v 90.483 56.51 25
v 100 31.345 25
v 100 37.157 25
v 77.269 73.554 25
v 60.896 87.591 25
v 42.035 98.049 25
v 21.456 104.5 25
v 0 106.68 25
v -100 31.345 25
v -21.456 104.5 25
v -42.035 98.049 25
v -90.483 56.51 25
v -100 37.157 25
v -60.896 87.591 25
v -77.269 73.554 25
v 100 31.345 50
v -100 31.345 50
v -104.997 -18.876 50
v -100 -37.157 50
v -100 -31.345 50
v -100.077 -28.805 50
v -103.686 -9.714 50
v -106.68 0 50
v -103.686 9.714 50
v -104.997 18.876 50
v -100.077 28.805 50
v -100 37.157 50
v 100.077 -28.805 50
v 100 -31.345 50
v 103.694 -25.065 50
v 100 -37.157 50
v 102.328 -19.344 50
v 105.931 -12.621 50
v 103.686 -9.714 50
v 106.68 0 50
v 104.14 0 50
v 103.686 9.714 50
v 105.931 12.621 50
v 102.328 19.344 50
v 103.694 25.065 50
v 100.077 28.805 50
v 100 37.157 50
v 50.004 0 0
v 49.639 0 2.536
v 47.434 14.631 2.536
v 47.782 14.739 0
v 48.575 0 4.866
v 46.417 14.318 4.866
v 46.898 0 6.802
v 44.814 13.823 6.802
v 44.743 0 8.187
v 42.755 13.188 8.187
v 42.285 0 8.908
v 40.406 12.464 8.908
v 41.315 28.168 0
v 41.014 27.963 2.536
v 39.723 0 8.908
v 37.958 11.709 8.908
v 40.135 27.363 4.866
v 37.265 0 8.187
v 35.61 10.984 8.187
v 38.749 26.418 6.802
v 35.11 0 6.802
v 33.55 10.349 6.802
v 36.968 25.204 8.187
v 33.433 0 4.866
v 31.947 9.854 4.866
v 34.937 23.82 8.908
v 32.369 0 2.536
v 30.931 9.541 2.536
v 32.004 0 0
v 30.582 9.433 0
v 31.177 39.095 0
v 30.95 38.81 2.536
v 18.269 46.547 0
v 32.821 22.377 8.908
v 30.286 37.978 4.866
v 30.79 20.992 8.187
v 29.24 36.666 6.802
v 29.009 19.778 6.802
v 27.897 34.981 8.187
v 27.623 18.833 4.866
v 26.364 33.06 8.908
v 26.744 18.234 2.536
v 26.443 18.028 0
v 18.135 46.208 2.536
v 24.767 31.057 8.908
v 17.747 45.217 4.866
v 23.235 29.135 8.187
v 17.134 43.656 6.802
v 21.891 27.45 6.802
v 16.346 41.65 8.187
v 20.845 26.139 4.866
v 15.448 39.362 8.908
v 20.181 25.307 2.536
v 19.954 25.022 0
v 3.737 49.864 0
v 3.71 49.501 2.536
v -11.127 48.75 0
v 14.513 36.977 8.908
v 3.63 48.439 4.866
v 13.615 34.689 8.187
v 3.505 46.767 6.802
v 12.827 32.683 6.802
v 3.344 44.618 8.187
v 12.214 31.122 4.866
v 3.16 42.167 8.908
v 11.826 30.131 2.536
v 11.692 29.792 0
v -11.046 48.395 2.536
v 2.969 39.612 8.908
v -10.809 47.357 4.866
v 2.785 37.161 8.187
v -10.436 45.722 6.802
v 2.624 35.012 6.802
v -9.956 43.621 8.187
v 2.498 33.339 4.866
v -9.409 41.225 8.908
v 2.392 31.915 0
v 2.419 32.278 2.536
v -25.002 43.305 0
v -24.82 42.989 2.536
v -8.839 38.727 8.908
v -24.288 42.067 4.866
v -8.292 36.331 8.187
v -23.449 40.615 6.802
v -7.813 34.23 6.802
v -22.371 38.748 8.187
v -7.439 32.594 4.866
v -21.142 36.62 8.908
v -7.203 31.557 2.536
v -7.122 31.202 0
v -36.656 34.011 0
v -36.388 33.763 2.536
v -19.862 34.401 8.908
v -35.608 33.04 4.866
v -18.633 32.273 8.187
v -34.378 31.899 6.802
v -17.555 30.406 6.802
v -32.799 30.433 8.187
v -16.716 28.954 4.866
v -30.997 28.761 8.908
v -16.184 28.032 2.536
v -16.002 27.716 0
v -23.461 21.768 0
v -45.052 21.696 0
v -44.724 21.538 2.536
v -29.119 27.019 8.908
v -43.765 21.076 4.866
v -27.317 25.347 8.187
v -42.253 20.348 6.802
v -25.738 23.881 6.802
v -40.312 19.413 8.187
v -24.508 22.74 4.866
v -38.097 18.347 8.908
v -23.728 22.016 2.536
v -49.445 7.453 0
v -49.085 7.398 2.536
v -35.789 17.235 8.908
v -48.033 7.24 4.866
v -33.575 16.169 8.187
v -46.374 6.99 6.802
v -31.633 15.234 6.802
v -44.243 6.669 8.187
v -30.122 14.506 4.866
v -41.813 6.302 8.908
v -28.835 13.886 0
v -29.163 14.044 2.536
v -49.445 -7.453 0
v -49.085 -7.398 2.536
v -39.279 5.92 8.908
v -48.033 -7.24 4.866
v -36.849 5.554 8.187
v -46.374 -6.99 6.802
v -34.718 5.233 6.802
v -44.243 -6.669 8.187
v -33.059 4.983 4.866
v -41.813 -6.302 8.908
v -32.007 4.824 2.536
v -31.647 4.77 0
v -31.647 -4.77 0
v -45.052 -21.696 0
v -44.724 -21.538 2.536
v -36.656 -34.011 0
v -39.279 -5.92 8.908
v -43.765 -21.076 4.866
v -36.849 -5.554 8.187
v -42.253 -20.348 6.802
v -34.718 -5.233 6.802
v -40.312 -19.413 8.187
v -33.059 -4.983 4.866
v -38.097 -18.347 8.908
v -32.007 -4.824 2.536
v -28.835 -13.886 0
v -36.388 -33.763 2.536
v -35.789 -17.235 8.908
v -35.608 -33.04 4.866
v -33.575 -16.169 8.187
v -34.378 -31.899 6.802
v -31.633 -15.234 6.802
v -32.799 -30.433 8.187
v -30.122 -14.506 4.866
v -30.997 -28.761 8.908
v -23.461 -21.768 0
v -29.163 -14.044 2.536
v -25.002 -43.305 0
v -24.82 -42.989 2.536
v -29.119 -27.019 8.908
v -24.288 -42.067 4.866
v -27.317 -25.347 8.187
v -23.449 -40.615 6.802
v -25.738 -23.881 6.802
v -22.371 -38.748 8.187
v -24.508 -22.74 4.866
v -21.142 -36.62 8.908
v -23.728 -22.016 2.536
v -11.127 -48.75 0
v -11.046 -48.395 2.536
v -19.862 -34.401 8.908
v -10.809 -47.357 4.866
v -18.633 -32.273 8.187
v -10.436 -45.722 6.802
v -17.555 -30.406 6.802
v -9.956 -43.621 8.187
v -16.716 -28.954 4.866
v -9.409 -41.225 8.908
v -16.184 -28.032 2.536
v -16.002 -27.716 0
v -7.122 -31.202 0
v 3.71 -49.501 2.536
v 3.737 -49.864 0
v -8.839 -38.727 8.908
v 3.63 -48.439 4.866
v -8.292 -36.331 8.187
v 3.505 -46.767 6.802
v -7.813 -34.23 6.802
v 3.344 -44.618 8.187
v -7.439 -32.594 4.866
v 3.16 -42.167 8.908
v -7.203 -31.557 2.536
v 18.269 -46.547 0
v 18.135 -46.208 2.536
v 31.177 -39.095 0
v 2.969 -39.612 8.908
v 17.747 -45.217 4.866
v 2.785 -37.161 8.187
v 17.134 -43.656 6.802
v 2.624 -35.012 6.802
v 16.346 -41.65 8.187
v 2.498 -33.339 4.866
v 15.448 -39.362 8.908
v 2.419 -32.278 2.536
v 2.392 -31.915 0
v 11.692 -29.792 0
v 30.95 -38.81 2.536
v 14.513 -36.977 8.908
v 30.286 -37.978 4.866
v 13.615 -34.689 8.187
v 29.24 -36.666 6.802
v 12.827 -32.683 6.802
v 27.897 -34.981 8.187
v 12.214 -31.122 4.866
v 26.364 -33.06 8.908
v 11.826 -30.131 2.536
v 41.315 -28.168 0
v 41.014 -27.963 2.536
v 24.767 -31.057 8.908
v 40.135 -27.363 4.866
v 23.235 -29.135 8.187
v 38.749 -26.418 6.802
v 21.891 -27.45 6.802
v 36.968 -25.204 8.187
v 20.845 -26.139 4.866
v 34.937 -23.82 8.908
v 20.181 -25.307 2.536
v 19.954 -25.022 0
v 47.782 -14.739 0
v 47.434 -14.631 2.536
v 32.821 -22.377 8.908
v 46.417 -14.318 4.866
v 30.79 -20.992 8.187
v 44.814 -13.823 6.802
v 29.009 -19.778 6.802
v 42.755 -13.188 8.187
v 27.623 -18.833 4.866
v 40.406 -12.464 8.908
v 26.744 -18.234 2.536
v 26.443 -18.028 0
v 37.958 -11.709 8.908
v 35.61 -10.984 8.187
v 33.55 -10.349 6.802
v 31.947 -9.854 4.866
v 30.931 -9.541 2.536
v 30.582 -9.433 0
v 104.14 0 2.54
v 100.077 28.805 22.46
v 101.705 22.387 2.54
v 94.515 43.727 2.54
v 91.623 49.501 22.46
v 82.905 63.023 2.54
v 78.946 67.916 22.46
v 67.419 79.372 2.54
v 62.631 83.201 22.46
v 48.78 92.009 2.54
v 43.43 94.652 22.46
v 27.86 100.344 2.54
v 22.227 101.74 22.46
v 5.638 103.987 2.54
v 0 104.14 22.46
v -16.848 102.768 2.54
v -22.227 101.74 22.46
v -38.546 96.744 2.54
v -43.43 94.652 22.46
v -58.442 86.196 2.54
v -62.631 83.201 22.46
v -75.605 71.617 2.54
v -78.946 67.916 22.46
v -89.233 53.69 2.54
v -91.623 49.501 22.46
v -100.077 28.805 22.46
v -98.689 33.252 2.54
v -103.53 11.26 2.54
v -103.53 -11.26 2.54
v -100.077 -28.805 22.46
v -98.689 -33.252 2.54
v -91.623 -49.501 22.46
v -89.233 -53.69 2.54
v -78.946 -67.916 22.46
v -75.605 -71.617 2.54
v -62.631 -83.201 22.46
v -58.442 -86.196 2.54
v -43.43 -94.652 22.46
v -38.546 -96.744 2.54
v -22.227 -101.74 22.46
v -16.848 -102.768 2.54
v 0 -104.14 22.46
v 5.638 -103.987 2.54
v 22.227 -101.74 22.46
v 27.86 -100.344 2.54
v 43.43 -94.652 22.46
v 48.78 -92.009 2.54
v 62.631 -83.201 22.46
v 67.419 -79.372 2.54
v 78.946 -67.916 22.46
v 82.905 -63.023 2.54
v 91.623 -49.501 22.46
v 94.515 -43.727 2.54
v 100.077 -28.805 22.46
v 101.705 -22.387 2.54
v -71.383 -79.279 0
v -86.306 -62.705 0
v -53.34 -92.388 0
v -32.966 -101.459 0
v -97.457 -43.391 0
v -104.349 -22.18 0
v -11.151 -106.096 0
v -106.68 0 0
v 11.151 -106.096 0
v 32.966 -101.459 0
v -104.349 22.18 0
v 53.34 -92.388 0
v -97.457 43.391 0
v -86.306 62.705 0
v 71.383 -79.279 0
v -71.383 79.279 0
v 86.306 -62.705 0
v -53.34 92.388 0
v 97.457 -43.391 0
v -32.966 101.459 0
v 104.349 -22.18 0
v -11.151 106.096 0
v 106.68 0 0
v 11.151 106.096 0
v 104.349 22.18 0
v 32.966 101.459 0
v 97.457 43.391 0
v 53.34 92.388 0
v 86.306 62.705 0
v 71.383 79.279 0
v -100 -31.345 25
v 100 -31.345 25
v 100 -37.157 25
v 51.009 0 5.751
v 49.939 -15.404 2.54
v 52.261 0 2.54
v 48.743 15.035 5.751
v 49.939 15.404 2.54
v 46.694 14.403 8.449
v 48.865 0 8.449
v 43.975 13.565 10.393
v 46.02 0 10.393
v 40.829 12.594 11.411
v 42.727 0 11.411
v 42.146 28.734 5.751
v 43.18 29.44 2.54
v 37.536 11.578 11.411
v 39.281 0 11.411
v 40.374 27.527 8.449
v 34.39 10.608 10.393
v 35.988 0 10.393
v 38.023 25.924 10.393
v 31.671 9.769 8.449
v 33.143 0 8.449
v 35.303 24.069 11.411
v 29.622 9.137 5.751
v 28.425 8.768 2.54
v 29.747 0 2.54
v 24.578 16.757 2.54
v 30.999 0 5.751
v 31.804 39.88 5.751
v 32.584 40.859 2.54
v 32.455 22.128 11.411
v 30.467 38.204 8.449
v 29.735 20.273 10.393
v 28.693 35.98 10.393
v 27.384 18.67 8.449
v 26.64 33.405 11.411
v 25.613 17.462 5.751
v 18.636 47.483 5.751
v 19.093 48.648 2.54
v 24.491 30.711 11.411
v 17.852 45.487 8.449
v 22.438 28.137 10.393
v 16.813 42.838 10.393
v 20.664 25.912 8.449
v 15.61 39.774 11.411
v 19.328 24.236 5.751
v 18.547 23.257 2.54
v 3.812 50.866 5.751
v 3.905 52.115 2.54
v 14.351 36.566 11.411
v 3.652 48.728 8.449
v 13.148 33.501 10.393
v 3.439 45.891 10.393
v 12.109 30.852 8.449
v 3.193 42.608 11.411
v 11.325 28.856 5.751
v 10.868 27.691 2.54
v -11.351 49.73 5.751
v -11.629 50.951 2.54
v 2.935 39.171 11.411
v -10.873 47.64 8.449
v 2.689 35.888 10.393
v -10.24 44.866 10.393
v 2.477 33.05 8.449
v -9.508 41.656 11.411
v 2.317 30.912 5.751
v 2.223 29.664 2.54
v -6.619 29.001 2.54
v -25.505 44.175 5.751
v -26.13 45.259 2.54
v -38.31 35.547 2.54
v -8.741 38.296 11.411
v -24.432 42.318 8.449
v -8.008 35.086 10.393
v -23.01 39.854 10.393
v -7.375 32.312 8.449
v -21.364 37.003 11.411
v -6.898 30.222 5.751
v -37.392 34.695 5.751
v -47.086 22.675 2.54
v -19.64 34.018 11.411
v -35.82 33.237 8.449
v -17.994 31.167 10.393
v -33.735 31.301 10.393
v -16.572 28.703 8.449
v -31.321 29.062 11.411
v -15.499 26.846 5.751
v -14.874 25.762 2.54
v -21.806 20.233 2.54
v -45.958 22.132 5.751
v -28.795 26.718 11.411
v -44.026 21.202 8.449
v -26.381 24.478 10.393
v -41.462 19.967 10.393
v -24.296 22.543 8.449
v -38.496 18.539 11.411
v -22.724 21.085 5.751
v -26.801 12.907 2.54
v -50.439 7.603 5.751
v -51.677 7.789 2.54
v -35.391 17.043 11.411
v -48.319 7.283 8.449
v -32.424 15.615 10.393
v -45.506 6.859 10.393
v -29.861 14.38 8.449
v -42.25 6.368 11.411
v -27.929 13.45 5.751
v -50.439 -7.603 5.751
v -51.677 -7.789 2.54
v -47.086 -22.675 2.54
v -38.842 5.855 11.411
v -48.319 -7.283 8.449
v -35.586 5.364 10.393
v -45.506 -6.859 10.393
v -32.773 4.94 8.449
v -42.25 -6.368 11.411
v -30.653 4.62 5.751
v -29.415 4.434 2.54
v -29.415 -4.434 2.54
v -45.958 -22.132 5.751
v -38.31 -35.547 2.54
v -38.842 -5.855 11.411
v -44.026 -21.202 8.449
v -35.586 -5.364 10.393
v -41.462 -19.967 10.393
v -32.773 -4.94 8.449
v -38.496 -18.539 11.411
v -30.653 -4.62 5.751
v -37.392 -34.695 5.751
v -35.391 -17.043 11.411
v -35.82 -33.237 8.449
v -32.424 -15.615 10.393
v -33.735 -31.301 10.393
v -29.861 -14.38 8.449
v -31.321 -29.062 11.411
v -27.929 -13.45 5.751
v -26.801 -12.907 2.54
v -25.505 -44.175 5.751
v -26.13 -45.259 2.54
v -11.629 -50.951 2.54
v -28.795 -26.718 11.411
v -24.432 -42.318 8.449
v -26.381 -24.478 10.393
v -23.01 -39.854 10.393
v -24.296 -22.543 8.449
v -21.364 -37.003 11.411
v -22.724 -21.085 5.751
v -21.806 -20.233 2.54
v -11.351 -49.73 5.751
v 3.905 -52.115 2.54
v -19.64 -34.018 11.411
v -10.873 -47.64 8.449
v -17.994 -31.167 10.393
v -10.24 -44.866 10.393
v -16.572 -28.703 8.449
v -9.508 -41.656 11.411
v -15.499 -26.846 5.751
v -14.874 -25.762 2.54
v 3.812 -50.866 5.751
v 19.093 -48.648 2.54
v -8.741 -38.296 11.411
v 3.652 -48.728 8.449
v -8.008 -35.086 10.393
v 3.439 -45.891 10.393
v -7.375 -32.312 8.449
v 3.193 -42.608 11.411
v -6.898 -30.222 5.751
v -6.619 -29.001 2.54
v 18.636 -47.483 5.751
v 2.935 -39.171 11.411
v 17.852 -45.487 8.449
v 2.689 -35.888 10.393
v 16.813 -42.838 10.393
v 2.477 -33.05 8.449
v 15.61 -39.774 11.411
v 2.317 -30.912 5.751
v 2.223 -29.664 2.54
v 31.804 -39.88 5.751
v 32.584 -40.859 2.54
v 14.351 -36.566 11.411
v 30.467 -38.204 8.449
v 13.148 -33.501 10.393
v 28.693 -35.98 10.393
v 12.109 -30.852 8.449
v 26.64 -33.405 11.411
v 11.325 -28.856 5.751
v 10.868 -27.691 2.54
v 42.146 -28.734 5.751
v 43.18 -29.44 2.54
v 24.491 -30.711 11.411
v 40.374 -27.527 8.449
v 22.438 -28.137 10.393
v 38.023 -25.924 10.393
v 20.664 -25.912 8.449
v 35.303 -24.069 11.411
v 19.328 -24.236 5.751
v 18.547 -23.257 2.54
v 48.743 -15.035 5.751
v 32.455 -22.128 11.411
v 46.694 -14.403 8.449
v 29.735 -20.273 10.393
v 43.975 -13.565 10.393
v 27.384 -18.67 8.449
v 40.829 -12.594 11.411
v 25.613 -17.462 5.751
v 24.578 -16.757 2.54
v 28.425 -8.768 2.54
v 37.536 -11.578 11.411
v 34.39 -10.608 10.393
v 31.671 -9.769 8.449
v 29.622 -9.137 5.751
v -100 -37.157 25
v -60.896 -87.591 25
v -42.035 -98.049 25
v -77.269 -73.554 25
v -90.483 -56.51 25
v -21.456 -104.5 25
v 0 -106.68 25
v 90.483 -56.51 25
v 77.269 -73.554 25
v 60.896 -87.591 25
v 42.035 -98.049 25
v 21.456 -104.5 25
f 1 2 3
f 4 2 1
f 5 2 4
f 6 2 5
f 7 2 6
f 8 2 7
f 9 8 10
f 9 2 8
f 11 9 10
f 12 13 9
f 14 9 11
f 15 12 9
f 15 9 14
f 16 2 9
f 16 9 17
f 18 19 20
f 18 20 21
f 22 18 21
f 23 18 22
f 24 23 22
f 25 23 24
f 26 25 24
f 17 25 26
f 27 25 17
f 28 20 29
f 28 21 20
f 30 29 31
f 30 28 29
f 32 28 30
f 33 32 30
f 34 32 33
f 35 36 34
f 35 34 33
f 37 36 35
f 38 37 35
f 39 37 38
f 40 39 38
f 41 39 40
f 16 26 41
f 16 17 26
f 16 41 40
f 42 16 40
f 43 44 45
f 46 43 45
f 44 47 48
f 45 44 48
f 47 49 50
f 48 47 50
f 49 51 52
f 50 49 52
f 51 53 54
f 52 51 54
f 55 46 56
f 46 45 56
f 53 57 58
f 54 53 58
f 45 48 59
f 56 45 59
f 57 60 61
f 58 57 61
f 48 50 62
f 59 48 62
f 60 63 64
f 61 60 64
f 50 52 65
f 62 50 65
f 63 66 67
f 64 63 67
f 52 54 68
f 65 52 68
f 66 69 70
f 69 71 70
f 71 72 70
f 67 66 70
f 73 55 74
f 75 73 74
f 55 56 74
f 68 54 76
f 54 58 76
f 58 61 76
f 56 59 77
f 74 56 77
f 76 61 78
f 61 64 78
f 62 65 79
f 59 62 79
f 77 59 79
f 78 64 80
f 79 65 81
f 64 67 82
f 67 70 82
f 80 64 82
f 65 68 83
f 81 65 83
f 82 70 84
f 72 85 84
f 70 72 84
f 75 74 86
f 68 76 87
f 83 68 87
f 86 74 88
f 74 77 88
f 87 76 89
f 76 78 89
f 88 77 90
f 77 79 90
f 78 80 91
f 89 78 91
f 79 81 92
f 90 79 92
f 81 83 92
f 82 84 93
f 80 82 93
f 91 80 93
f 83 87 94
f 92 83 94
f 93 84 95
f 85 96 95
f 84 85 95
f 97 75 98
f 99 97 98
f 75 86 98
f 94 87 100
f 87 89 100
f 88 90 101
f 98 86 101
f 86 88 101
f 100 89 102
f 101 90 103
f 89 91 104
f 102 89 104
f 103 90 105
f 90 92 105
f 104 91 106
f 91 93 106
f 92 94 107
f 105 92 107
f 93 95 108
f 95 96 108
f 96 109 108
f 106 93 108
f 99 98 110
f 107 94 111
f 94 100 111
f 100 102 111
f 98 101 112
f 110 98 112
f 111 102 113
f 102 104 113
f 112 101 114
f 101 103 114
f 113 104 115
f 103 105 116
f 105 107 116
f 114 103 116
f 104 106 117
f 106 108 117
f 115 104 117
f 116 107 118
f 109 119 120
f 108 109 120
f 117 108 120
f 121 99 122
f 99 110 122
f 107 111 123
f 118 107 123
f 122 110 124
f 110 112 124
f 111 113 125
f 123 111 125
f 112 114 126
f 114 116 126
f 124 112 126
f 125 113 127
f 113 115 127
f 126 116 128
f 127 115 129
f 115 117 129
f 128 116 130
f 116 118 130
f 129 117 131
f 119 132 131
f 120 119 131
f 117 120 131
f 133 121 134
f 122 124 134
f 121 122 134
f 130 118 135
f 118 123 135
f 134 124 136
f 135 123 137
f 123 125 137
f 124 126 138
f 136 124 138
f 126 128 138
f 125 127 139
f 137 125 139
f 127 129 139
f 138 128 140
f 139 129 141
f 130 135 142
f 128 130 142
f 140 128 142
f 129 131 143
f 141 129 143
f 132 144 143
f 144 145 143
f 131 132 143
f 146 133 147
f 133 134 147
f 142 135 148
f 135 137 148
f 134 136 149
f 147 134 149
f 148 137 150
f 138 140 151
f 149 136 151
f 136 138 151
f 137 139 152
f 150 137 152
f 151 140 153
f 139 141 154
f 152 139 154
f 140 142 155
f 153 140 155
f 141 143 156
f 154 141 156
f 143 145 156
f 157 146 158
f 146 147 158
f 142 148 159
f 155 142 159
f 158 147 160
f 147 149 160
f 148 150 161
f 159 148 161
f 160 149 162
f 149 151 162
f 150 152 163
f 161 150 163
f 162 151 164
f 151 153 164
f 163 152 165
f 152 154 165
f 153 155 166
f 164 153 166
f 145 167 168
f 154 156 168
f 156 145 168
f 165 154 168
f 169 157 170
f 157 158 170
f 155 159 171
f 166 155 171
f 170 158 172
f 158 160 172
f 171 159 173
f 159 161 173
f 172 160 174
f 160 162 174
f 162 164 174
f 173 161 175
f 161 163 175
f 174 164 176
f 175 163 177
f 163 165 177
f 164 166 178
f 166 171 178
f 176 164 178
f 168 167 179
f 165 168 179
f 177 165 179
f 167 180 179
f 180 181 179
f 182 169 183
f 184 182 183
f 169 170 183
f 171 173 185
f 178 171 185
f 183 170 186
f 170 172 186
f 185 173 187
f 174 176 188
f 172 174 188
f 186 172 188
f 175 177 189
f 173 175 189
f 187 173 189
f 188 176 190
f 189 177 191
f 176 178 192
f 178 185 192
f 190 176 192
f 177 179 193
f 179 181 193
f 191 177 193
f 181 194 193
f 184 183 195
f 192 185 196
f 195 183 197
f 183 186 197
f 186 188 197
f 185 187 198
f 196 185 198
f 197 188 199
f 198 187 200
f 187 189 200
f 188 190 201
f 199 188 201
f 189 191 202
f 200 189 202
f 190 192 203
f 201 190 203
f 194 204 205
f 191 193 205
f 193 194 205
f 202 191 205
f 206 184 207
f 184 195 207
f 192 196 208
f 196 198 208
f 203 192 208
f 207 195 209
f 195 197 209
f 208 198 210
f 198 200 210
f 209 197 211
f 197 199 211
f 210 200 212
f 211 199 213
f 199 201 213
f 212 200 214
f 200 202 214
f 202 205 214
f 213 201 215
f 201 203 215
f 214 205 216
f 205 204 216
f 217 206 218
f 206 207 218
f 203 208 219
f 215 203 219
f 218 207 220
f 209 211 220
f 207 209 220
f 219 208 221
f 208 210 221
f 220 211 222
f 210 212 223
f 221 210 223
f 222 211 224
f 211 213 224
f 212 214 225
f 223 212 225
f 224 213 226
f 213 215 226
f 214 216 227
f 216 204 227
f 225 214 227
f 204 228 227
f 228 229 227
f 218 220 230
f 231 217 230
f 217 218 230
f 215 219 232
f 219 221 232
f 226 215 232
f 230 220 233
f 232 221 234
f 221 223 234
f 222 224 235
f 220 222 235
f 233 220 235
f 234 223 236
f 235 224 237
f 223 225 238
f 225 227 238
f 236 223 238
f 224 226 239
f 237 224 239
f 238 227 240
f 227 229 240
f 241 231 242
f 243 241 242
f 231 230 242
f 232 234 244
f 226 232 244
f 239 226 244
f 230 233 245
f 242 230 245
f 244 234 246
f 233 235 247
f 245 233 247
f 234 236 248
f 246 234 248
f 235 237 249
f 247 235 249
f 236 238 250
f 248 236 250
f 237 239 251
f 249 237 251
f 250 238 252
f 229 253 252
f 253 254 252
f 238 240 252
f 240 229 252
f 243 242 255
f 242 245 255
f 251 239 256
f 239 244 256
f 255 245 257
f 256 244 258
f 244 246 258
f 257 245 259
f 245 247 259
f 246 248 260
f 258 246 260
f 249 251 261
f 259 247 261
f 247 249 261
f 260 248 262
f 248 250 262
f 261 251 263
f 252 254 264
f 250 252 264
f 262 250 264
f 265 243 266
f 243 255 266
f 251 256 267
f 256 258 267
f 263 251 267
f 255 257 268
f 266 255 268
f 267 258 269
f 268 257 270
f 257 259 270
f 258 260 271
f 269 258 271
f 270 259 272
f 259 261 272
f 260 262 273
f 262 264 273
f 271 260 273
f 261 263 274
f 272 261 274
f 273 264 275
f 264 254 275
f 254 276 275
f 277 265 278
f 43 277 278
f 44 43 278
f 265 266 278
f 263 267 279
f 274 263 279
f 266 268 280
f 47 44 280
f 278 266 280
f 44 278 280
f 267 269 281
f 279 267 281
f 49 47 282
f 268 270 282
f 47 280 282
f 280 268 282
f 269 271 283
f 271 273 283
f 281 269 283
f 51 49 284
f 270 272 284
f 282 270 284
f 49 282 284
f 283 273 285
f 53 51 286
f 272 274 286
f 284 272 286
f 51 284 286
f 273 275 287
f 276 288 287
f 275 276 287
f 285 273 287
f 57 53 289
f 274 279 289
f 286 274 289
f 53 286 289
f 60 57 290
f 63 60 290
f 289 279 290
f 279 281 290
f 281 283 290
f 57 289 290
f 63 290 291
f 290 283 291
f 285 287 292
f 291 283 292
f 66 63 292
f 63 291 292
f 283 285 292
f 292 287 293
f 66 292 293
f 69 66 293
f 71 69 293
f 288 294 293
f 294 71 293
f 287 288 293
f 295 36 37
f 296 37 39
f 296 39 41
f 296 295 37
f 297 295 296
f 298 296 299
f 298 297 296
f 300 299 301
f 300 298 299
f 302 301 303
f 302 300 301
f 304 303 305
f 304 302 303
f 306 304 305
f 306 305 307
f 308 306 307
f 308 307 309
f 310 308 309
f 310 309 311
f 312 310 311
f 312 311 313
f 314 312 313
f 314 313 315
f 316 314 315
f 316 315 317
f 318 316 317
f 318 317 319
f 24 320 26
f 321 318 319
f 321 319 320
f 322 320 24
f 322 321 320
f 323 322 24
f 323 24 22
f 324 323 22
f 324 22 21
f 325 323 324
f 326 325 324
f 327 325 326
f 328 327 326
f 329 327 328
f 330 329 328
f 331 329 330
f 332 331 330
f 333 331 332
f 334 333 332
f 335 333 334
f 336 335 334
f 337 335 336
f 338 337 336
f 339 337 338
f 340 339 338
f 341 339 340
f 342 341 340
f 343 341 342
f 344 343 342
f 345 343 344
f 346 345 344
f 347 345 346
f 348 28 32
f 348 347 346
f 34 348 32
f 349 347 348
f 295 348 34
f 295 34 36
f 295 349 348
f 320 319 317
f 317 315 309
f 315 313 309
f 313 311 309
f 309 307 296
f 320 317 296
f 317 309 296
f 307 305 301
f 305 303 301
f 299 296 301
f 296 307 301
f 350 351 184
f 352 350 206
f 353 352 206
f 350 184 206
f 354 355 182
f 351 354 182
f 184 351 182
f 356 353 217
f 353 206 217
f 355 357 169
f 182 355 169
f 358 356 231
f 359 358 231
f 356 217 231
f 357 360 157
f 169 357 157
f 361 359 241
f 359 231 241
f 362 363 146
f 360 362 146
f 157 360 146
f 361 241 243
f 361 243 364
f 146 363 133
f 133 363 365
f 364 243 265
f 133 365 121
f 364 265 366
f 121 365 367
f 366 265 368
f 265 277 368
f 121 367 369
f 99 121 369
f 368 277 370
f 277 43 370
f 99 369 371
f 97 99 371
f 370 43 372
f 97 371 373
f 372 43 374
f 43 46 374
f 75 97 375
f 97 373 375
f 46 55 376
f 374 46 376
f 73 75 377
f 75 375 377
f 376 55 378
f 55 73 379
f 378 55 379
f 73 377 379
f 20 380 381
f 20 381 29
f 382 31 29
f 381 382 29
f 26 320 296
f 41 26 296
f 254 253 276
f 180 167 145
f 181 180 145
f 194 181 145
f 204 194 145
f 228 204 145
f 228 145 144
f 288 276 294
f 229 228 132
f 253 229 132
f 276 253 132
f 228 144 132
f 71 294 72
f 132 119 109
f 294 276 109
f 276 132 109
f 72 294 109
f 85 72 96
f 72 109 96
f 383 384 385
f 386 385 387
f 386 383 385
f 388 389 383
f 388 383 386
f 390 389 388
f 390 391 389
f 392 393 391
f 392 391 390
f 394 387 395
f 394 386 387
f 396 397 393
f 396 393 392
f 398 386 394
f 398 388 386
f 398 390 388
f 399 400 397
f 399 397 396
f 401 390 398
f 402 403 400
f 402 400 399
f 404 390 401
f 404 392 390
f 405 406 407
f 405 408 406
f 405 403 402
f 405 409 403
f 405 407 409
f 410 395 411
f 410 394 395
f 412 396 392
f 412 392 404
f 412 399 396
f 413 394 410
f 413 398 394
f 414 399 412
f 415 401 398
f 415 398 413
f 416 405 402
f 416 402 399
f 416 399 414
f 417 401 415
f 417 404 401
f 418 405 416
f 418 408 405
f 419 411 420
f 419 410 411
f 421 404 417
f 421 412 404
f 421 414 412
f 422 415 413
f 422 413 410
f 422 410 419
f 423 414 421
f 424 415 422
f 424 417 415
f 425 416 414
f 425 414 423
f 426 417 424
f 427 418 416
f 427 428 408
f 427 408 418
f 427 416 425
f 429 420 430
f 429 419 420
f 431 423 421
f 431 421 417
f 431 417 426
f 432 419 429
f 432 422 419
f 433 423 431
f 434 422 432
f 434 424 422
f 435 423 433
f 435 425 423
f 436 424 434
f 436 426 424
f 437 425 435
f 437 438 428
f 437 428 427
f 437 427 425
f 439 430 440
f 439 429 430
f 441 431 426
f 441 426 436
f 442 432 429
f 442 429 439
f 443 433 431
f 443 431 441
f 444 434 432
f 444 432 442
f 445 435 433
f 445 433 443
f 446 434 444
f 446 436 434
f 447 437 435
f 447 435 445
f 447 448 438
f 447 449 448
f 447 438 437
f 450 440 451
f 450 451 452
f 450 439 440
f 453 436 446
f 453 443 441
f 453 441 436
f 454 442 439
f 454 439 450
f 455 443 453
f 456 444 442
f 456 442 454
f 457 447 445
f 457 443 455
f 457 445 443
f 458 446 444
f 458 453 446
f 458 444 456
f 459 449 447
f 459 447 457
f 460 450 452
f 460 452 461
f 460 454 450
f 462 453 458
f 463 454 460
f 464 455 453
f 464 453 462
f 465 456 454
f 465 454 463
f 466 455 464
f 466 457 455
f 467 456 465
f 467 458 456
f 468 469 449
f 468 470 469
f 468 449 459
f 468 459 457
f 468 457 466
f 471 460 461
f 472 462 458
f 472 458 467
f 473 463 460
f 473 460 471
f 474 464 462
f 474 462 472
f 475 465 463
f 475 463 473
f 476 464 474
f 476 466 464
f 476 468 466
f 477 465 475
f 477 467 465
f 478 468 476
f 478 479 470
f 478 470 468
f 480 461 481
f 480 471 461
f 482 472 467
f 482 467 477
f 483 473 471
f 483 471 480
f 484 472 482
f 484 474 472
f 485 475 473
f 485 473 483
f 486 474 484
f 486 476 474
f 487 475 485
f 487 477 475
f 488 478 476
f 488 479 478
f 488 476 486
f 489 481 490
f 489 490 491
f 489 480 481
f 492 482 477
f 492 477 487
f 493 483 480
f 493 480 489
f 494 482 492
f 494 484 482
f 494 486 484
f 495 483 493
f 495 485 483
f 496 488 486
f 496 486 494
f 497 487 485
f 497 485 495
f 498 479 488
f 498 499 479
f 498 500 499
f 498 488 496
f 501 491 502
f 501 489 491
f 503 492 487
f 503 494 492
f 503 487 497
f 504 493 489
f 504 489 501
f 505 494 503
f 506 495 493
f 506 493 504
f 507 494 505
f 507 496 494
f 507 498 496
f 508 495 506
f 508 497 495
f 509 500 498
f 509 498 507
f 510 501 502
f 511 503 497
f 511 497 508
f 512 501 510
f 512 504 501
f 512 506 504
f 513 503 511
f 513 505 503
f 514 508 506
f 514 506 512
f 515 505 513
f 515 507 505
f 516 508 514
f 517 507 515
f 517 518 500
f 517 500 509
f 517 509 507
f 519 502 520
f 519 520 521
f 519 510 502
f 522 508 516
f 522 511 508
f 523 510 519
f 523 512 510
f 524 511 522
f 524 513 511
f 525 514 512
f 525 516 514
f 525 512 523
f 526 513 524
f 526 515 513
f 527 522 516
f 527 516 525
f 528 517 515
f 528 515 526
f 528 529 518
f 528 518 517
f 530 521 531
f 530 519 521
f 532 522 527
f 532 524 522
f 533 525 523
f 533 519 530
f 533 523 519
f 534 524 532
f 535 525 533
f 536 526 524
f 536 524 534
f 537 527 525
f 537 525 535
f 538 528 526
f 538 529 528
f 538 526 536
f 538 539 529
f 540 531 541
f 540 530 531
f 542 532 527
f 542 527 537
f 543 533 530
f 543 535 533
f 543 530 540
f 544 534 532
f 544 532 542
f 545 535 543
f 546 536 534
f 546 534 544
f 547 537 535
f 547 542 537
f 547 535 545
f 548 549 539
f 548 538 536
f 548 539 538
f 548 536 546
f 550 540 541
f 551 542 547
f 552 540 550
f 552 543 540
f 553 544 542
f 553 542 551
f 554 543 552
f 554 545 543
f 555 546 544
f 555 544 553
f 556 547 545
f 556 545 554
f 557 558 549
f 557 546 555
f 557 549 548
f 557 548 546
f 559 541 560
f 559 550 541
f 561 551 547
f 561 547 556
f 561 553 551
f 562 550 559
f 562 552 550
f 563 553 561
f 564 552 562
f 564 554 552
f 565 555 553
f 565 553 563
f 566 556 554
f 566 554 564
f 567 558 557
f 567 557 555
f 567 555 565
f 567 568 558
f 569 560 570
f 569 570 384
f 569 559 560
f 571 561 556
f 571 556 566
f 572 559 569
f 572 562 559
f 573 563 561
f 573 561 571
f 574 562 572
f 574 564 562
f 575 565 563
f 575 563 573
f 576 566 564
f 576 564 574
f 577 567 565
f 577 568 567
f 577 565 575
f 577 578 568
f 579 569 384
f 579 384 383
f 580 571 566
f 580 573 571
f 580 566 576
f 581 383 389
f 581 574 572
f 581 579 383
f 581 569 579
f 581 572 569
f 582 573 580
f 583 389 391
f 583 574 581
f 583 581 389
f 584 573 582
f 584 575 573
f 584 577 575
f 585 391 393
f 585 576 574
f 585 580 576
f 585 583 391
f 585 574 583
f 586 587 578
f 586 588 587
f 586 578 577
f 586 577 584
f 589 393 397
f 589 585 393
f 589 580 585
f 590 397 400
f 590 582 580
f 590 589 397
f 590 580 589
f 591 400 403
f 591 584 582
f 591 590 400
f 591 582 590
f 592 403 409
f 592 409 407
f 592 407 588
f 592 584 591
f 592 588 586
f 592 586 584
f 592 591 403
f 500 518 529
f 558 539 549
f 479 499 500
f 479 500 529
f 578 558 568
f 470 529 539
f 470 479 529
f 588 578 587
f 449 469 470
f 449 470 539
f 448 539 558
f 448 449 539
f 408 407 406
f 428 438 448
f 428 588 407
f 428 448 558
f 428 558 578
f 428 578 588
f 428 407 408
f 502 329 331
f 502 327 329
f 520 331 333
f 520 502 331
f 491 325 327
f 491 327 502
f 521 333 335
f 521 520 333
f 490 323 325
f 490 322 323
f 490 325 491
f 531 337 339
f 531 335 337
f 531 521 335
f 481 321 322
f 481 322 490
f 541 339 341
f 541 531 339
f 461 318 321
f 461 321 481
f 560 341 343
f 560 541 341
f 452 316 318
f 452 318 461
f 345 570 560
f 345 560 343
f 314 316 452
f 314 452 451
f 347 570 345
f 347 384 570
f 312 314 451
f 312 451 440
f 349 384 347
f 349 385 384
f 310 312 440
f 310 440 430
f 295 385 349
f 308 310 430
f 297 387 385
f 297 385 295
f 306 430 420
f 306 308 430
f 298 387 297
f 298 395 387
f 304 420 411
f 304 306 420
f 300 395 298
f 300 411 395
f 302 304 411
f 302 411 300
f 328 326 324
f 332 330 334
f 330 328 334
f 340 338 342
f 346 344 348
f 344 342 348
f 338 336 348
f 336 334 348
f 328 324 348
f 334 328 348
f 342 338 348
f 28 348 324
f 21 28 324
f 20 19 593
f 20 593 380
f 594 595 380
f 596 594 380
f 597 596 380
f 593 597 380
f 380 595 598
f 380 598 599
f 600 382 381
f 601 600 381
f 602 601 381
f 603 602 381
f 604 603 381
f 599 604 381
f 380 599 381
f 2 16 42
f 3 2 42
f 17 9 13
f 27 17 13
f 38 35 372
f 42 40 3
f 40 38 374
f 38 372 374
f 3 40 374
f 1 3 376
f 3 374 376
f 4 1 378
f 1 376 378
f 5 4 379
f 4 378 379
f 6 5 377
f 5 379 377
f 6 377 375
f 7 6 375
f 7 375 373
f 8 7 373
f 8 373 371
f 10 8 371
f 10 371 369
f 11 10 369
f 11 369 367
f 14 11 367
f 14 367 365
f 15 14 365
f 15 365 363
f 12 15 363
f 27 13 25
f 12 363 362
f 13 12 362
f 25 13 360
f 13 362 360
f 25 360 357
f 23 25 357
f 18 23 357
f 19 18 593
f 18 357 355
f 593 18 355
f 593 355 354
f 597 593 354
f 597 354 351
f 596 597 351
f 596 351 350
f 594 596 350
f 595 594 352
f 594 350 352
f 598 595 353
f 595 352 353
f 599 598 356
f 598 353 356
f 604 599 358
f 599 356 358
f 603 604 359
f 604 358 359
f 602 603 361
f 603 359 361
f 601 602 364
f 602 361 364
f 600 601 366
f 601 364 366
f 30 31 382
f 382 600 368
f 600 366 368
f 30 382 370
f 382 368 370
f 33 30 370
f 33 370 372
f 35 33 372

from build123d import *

# Parameters (mm, degrees)
F0_R        = 106.68
F1_DEPTH    = 50
F2_R        = 9
F4_W        = 88.5786805532
F4_H        = 25.534863025
F5_DEPTH    = 100
F6_T        = 2.54
F6_T3_DEPTH = 30.08
F6_T5_DEPTH = 10.8915489546
F6_T7_DEPTH = 205.08
F6_T9_DEPTH = 10.8915489546


# Not quite as in the source:
# - a shell that OpenCascade refuses in one call is made with other operations: the cavity is built on its own and cut out


with BuildPart() as f1:
    # F0 (on Top) → F1 (new body)
    with BuildSketch(Plane.XY):
        Circle(F0_R)
    extrude(amount=F1_DEPTH)

    # F2 (on Front) → F3 (revolve, cut)
    with BuildSketch(Plane.XZ):
        with Locations((41.004, 0)):
            Circle(F2_R)
    revolve(axis=Axis((0, 0, 20.5781124532), (0, 0, 1)), mode=Mode.SUBTRACT)

    # F4 (on Right) → F5 (cut, symmetric)
    with BuildSketch(Plane.YZ):
        with Locations((75.6345188421, 37.7674315125)):
            Rectangle(F4_W, F4_H)
        with Locations((-75.6345188421, 37.7674315125)):
            Rectangle(F4_W, F4_H)
    extrude(amount=F5_DEPTH, both=True, mode=Mode.SUBTRACT)

    # F6: shell of thickness 2.54, made by hand


with BuildPart() as f6_core1:
    # F6_t2: copy of F1
    add(f1.part)

    # the walls: a layer under each face that stays
    f6_faces = [f6_core1.faces().sort_by_distance(p)[0] for p in [
        (-106.68, 0, 25),
        (-71.12, -71.12, 0),
        (100, -34.2509530428, 37.5),
        (0, -69.0125892827, 25),
        (-100, -34.2509530428, 37.5),
        (-100, 34.2509530428, 37.5),
        (0, 69.0125892827, 25),
        (100, 34.2509530428, 37.5),
        (-41.004, 0, 9),
        (0, -31.3451785655, 37.5),
        (0, 31.3451785655, 37.5),
        (0, 0, 0),
    ]]
    thicken(f6_faces, amount=-F6_T, mode=Mode.SUBTRACT)

    # F6_s4 → F6_t3 (cut)
    with BuildSketch(Plane.XY.offset(22.46)):
        Polygon((99.9746, -31.3705785655), (102.54, -31.3451785655), (102.54, -28.8051785655), (100, -28.8051785655), align=None)
        Polygon((-99.9746, -31.3705785655), (-102.54, -31.3451785655), (-102.54, -28.8051785655), (-100, -28.8051785655), align=None)
        Polygon((-99.9746, 31.3705785655), (-102.54, 31.3451785655), (-102.54, 28.8051785655), (-100, 28.8051785655), align=None)
        Polygon((99.9746, 31.3705785655), (102.54, 31.3451785655), (102.54, 28.8051785655), (100, 28.8051785655), align=None)
    extrude(amount=F6_T3_DEPTH, mode=Mode.SUBTRACT)

    # F6_s6 → F6_t5 (cut)
    with BuildSketch(Plane.XZ.offset(28.8051785655)):
        Polygon((99.9746, 25.0254), (102.54, 25), (102.54, 22.46), (100, 22.46), align=None)
        Polygon((-99.9746, 25.0254), (-100, 22.46), (-102.54, 22.46), (-102.54, 25), align=None)
    extrude(amount=F6_T5_DEPTH, mode=Mode.SUBTRACT)

    # F6_s8 → F6_t7 (cut)
    with BuildSketch(Plane.YZ.offset(-102.54)):
        Polygon((-31.3705785655, 25.0254), (-31.3451785655, 22.46), (-28.8051785655, 22.46), (-28.8051785655, 25), align=None)
        Polygon((31.3705785655, 25.0254), (31.3451785655, 22.46), (28.8051785655, 22.46), (28.8051785655, 25), align=None)
    extrude(amount=F6_T7_DEPTH, mode=Mode.SUBTRACT)

    # F6_s10 → F6_t9 (cut)
    with BuildSketch(Plane.XZ.offset(-39.6967275201)):
        Polygon((-99.9746, 25.0254), (-102.54, 25), (-102.54, 22.46), (-100, 22.46), align=None)
        Polygon((99.9746, 25.0254), (100, 22.46), (102.54, 22.46), (102.54, 25), align=None)
    extrude(amount=F6_T9_DEPTH, mode=Mode.SUBTRACT)


with BuildPart() as f1_1:
    add(f1.part)

    # what is left inside the walls is the cavity
    f6_cavity = [f6_core1.part.solids().sort_by_distance(p)[0] for p in [
        (-52.07, 34.713333, 2.5654),
    ]]
    add(f6_cavity, mode=Mode.SUBTRACT)


solid = f1_1.part
